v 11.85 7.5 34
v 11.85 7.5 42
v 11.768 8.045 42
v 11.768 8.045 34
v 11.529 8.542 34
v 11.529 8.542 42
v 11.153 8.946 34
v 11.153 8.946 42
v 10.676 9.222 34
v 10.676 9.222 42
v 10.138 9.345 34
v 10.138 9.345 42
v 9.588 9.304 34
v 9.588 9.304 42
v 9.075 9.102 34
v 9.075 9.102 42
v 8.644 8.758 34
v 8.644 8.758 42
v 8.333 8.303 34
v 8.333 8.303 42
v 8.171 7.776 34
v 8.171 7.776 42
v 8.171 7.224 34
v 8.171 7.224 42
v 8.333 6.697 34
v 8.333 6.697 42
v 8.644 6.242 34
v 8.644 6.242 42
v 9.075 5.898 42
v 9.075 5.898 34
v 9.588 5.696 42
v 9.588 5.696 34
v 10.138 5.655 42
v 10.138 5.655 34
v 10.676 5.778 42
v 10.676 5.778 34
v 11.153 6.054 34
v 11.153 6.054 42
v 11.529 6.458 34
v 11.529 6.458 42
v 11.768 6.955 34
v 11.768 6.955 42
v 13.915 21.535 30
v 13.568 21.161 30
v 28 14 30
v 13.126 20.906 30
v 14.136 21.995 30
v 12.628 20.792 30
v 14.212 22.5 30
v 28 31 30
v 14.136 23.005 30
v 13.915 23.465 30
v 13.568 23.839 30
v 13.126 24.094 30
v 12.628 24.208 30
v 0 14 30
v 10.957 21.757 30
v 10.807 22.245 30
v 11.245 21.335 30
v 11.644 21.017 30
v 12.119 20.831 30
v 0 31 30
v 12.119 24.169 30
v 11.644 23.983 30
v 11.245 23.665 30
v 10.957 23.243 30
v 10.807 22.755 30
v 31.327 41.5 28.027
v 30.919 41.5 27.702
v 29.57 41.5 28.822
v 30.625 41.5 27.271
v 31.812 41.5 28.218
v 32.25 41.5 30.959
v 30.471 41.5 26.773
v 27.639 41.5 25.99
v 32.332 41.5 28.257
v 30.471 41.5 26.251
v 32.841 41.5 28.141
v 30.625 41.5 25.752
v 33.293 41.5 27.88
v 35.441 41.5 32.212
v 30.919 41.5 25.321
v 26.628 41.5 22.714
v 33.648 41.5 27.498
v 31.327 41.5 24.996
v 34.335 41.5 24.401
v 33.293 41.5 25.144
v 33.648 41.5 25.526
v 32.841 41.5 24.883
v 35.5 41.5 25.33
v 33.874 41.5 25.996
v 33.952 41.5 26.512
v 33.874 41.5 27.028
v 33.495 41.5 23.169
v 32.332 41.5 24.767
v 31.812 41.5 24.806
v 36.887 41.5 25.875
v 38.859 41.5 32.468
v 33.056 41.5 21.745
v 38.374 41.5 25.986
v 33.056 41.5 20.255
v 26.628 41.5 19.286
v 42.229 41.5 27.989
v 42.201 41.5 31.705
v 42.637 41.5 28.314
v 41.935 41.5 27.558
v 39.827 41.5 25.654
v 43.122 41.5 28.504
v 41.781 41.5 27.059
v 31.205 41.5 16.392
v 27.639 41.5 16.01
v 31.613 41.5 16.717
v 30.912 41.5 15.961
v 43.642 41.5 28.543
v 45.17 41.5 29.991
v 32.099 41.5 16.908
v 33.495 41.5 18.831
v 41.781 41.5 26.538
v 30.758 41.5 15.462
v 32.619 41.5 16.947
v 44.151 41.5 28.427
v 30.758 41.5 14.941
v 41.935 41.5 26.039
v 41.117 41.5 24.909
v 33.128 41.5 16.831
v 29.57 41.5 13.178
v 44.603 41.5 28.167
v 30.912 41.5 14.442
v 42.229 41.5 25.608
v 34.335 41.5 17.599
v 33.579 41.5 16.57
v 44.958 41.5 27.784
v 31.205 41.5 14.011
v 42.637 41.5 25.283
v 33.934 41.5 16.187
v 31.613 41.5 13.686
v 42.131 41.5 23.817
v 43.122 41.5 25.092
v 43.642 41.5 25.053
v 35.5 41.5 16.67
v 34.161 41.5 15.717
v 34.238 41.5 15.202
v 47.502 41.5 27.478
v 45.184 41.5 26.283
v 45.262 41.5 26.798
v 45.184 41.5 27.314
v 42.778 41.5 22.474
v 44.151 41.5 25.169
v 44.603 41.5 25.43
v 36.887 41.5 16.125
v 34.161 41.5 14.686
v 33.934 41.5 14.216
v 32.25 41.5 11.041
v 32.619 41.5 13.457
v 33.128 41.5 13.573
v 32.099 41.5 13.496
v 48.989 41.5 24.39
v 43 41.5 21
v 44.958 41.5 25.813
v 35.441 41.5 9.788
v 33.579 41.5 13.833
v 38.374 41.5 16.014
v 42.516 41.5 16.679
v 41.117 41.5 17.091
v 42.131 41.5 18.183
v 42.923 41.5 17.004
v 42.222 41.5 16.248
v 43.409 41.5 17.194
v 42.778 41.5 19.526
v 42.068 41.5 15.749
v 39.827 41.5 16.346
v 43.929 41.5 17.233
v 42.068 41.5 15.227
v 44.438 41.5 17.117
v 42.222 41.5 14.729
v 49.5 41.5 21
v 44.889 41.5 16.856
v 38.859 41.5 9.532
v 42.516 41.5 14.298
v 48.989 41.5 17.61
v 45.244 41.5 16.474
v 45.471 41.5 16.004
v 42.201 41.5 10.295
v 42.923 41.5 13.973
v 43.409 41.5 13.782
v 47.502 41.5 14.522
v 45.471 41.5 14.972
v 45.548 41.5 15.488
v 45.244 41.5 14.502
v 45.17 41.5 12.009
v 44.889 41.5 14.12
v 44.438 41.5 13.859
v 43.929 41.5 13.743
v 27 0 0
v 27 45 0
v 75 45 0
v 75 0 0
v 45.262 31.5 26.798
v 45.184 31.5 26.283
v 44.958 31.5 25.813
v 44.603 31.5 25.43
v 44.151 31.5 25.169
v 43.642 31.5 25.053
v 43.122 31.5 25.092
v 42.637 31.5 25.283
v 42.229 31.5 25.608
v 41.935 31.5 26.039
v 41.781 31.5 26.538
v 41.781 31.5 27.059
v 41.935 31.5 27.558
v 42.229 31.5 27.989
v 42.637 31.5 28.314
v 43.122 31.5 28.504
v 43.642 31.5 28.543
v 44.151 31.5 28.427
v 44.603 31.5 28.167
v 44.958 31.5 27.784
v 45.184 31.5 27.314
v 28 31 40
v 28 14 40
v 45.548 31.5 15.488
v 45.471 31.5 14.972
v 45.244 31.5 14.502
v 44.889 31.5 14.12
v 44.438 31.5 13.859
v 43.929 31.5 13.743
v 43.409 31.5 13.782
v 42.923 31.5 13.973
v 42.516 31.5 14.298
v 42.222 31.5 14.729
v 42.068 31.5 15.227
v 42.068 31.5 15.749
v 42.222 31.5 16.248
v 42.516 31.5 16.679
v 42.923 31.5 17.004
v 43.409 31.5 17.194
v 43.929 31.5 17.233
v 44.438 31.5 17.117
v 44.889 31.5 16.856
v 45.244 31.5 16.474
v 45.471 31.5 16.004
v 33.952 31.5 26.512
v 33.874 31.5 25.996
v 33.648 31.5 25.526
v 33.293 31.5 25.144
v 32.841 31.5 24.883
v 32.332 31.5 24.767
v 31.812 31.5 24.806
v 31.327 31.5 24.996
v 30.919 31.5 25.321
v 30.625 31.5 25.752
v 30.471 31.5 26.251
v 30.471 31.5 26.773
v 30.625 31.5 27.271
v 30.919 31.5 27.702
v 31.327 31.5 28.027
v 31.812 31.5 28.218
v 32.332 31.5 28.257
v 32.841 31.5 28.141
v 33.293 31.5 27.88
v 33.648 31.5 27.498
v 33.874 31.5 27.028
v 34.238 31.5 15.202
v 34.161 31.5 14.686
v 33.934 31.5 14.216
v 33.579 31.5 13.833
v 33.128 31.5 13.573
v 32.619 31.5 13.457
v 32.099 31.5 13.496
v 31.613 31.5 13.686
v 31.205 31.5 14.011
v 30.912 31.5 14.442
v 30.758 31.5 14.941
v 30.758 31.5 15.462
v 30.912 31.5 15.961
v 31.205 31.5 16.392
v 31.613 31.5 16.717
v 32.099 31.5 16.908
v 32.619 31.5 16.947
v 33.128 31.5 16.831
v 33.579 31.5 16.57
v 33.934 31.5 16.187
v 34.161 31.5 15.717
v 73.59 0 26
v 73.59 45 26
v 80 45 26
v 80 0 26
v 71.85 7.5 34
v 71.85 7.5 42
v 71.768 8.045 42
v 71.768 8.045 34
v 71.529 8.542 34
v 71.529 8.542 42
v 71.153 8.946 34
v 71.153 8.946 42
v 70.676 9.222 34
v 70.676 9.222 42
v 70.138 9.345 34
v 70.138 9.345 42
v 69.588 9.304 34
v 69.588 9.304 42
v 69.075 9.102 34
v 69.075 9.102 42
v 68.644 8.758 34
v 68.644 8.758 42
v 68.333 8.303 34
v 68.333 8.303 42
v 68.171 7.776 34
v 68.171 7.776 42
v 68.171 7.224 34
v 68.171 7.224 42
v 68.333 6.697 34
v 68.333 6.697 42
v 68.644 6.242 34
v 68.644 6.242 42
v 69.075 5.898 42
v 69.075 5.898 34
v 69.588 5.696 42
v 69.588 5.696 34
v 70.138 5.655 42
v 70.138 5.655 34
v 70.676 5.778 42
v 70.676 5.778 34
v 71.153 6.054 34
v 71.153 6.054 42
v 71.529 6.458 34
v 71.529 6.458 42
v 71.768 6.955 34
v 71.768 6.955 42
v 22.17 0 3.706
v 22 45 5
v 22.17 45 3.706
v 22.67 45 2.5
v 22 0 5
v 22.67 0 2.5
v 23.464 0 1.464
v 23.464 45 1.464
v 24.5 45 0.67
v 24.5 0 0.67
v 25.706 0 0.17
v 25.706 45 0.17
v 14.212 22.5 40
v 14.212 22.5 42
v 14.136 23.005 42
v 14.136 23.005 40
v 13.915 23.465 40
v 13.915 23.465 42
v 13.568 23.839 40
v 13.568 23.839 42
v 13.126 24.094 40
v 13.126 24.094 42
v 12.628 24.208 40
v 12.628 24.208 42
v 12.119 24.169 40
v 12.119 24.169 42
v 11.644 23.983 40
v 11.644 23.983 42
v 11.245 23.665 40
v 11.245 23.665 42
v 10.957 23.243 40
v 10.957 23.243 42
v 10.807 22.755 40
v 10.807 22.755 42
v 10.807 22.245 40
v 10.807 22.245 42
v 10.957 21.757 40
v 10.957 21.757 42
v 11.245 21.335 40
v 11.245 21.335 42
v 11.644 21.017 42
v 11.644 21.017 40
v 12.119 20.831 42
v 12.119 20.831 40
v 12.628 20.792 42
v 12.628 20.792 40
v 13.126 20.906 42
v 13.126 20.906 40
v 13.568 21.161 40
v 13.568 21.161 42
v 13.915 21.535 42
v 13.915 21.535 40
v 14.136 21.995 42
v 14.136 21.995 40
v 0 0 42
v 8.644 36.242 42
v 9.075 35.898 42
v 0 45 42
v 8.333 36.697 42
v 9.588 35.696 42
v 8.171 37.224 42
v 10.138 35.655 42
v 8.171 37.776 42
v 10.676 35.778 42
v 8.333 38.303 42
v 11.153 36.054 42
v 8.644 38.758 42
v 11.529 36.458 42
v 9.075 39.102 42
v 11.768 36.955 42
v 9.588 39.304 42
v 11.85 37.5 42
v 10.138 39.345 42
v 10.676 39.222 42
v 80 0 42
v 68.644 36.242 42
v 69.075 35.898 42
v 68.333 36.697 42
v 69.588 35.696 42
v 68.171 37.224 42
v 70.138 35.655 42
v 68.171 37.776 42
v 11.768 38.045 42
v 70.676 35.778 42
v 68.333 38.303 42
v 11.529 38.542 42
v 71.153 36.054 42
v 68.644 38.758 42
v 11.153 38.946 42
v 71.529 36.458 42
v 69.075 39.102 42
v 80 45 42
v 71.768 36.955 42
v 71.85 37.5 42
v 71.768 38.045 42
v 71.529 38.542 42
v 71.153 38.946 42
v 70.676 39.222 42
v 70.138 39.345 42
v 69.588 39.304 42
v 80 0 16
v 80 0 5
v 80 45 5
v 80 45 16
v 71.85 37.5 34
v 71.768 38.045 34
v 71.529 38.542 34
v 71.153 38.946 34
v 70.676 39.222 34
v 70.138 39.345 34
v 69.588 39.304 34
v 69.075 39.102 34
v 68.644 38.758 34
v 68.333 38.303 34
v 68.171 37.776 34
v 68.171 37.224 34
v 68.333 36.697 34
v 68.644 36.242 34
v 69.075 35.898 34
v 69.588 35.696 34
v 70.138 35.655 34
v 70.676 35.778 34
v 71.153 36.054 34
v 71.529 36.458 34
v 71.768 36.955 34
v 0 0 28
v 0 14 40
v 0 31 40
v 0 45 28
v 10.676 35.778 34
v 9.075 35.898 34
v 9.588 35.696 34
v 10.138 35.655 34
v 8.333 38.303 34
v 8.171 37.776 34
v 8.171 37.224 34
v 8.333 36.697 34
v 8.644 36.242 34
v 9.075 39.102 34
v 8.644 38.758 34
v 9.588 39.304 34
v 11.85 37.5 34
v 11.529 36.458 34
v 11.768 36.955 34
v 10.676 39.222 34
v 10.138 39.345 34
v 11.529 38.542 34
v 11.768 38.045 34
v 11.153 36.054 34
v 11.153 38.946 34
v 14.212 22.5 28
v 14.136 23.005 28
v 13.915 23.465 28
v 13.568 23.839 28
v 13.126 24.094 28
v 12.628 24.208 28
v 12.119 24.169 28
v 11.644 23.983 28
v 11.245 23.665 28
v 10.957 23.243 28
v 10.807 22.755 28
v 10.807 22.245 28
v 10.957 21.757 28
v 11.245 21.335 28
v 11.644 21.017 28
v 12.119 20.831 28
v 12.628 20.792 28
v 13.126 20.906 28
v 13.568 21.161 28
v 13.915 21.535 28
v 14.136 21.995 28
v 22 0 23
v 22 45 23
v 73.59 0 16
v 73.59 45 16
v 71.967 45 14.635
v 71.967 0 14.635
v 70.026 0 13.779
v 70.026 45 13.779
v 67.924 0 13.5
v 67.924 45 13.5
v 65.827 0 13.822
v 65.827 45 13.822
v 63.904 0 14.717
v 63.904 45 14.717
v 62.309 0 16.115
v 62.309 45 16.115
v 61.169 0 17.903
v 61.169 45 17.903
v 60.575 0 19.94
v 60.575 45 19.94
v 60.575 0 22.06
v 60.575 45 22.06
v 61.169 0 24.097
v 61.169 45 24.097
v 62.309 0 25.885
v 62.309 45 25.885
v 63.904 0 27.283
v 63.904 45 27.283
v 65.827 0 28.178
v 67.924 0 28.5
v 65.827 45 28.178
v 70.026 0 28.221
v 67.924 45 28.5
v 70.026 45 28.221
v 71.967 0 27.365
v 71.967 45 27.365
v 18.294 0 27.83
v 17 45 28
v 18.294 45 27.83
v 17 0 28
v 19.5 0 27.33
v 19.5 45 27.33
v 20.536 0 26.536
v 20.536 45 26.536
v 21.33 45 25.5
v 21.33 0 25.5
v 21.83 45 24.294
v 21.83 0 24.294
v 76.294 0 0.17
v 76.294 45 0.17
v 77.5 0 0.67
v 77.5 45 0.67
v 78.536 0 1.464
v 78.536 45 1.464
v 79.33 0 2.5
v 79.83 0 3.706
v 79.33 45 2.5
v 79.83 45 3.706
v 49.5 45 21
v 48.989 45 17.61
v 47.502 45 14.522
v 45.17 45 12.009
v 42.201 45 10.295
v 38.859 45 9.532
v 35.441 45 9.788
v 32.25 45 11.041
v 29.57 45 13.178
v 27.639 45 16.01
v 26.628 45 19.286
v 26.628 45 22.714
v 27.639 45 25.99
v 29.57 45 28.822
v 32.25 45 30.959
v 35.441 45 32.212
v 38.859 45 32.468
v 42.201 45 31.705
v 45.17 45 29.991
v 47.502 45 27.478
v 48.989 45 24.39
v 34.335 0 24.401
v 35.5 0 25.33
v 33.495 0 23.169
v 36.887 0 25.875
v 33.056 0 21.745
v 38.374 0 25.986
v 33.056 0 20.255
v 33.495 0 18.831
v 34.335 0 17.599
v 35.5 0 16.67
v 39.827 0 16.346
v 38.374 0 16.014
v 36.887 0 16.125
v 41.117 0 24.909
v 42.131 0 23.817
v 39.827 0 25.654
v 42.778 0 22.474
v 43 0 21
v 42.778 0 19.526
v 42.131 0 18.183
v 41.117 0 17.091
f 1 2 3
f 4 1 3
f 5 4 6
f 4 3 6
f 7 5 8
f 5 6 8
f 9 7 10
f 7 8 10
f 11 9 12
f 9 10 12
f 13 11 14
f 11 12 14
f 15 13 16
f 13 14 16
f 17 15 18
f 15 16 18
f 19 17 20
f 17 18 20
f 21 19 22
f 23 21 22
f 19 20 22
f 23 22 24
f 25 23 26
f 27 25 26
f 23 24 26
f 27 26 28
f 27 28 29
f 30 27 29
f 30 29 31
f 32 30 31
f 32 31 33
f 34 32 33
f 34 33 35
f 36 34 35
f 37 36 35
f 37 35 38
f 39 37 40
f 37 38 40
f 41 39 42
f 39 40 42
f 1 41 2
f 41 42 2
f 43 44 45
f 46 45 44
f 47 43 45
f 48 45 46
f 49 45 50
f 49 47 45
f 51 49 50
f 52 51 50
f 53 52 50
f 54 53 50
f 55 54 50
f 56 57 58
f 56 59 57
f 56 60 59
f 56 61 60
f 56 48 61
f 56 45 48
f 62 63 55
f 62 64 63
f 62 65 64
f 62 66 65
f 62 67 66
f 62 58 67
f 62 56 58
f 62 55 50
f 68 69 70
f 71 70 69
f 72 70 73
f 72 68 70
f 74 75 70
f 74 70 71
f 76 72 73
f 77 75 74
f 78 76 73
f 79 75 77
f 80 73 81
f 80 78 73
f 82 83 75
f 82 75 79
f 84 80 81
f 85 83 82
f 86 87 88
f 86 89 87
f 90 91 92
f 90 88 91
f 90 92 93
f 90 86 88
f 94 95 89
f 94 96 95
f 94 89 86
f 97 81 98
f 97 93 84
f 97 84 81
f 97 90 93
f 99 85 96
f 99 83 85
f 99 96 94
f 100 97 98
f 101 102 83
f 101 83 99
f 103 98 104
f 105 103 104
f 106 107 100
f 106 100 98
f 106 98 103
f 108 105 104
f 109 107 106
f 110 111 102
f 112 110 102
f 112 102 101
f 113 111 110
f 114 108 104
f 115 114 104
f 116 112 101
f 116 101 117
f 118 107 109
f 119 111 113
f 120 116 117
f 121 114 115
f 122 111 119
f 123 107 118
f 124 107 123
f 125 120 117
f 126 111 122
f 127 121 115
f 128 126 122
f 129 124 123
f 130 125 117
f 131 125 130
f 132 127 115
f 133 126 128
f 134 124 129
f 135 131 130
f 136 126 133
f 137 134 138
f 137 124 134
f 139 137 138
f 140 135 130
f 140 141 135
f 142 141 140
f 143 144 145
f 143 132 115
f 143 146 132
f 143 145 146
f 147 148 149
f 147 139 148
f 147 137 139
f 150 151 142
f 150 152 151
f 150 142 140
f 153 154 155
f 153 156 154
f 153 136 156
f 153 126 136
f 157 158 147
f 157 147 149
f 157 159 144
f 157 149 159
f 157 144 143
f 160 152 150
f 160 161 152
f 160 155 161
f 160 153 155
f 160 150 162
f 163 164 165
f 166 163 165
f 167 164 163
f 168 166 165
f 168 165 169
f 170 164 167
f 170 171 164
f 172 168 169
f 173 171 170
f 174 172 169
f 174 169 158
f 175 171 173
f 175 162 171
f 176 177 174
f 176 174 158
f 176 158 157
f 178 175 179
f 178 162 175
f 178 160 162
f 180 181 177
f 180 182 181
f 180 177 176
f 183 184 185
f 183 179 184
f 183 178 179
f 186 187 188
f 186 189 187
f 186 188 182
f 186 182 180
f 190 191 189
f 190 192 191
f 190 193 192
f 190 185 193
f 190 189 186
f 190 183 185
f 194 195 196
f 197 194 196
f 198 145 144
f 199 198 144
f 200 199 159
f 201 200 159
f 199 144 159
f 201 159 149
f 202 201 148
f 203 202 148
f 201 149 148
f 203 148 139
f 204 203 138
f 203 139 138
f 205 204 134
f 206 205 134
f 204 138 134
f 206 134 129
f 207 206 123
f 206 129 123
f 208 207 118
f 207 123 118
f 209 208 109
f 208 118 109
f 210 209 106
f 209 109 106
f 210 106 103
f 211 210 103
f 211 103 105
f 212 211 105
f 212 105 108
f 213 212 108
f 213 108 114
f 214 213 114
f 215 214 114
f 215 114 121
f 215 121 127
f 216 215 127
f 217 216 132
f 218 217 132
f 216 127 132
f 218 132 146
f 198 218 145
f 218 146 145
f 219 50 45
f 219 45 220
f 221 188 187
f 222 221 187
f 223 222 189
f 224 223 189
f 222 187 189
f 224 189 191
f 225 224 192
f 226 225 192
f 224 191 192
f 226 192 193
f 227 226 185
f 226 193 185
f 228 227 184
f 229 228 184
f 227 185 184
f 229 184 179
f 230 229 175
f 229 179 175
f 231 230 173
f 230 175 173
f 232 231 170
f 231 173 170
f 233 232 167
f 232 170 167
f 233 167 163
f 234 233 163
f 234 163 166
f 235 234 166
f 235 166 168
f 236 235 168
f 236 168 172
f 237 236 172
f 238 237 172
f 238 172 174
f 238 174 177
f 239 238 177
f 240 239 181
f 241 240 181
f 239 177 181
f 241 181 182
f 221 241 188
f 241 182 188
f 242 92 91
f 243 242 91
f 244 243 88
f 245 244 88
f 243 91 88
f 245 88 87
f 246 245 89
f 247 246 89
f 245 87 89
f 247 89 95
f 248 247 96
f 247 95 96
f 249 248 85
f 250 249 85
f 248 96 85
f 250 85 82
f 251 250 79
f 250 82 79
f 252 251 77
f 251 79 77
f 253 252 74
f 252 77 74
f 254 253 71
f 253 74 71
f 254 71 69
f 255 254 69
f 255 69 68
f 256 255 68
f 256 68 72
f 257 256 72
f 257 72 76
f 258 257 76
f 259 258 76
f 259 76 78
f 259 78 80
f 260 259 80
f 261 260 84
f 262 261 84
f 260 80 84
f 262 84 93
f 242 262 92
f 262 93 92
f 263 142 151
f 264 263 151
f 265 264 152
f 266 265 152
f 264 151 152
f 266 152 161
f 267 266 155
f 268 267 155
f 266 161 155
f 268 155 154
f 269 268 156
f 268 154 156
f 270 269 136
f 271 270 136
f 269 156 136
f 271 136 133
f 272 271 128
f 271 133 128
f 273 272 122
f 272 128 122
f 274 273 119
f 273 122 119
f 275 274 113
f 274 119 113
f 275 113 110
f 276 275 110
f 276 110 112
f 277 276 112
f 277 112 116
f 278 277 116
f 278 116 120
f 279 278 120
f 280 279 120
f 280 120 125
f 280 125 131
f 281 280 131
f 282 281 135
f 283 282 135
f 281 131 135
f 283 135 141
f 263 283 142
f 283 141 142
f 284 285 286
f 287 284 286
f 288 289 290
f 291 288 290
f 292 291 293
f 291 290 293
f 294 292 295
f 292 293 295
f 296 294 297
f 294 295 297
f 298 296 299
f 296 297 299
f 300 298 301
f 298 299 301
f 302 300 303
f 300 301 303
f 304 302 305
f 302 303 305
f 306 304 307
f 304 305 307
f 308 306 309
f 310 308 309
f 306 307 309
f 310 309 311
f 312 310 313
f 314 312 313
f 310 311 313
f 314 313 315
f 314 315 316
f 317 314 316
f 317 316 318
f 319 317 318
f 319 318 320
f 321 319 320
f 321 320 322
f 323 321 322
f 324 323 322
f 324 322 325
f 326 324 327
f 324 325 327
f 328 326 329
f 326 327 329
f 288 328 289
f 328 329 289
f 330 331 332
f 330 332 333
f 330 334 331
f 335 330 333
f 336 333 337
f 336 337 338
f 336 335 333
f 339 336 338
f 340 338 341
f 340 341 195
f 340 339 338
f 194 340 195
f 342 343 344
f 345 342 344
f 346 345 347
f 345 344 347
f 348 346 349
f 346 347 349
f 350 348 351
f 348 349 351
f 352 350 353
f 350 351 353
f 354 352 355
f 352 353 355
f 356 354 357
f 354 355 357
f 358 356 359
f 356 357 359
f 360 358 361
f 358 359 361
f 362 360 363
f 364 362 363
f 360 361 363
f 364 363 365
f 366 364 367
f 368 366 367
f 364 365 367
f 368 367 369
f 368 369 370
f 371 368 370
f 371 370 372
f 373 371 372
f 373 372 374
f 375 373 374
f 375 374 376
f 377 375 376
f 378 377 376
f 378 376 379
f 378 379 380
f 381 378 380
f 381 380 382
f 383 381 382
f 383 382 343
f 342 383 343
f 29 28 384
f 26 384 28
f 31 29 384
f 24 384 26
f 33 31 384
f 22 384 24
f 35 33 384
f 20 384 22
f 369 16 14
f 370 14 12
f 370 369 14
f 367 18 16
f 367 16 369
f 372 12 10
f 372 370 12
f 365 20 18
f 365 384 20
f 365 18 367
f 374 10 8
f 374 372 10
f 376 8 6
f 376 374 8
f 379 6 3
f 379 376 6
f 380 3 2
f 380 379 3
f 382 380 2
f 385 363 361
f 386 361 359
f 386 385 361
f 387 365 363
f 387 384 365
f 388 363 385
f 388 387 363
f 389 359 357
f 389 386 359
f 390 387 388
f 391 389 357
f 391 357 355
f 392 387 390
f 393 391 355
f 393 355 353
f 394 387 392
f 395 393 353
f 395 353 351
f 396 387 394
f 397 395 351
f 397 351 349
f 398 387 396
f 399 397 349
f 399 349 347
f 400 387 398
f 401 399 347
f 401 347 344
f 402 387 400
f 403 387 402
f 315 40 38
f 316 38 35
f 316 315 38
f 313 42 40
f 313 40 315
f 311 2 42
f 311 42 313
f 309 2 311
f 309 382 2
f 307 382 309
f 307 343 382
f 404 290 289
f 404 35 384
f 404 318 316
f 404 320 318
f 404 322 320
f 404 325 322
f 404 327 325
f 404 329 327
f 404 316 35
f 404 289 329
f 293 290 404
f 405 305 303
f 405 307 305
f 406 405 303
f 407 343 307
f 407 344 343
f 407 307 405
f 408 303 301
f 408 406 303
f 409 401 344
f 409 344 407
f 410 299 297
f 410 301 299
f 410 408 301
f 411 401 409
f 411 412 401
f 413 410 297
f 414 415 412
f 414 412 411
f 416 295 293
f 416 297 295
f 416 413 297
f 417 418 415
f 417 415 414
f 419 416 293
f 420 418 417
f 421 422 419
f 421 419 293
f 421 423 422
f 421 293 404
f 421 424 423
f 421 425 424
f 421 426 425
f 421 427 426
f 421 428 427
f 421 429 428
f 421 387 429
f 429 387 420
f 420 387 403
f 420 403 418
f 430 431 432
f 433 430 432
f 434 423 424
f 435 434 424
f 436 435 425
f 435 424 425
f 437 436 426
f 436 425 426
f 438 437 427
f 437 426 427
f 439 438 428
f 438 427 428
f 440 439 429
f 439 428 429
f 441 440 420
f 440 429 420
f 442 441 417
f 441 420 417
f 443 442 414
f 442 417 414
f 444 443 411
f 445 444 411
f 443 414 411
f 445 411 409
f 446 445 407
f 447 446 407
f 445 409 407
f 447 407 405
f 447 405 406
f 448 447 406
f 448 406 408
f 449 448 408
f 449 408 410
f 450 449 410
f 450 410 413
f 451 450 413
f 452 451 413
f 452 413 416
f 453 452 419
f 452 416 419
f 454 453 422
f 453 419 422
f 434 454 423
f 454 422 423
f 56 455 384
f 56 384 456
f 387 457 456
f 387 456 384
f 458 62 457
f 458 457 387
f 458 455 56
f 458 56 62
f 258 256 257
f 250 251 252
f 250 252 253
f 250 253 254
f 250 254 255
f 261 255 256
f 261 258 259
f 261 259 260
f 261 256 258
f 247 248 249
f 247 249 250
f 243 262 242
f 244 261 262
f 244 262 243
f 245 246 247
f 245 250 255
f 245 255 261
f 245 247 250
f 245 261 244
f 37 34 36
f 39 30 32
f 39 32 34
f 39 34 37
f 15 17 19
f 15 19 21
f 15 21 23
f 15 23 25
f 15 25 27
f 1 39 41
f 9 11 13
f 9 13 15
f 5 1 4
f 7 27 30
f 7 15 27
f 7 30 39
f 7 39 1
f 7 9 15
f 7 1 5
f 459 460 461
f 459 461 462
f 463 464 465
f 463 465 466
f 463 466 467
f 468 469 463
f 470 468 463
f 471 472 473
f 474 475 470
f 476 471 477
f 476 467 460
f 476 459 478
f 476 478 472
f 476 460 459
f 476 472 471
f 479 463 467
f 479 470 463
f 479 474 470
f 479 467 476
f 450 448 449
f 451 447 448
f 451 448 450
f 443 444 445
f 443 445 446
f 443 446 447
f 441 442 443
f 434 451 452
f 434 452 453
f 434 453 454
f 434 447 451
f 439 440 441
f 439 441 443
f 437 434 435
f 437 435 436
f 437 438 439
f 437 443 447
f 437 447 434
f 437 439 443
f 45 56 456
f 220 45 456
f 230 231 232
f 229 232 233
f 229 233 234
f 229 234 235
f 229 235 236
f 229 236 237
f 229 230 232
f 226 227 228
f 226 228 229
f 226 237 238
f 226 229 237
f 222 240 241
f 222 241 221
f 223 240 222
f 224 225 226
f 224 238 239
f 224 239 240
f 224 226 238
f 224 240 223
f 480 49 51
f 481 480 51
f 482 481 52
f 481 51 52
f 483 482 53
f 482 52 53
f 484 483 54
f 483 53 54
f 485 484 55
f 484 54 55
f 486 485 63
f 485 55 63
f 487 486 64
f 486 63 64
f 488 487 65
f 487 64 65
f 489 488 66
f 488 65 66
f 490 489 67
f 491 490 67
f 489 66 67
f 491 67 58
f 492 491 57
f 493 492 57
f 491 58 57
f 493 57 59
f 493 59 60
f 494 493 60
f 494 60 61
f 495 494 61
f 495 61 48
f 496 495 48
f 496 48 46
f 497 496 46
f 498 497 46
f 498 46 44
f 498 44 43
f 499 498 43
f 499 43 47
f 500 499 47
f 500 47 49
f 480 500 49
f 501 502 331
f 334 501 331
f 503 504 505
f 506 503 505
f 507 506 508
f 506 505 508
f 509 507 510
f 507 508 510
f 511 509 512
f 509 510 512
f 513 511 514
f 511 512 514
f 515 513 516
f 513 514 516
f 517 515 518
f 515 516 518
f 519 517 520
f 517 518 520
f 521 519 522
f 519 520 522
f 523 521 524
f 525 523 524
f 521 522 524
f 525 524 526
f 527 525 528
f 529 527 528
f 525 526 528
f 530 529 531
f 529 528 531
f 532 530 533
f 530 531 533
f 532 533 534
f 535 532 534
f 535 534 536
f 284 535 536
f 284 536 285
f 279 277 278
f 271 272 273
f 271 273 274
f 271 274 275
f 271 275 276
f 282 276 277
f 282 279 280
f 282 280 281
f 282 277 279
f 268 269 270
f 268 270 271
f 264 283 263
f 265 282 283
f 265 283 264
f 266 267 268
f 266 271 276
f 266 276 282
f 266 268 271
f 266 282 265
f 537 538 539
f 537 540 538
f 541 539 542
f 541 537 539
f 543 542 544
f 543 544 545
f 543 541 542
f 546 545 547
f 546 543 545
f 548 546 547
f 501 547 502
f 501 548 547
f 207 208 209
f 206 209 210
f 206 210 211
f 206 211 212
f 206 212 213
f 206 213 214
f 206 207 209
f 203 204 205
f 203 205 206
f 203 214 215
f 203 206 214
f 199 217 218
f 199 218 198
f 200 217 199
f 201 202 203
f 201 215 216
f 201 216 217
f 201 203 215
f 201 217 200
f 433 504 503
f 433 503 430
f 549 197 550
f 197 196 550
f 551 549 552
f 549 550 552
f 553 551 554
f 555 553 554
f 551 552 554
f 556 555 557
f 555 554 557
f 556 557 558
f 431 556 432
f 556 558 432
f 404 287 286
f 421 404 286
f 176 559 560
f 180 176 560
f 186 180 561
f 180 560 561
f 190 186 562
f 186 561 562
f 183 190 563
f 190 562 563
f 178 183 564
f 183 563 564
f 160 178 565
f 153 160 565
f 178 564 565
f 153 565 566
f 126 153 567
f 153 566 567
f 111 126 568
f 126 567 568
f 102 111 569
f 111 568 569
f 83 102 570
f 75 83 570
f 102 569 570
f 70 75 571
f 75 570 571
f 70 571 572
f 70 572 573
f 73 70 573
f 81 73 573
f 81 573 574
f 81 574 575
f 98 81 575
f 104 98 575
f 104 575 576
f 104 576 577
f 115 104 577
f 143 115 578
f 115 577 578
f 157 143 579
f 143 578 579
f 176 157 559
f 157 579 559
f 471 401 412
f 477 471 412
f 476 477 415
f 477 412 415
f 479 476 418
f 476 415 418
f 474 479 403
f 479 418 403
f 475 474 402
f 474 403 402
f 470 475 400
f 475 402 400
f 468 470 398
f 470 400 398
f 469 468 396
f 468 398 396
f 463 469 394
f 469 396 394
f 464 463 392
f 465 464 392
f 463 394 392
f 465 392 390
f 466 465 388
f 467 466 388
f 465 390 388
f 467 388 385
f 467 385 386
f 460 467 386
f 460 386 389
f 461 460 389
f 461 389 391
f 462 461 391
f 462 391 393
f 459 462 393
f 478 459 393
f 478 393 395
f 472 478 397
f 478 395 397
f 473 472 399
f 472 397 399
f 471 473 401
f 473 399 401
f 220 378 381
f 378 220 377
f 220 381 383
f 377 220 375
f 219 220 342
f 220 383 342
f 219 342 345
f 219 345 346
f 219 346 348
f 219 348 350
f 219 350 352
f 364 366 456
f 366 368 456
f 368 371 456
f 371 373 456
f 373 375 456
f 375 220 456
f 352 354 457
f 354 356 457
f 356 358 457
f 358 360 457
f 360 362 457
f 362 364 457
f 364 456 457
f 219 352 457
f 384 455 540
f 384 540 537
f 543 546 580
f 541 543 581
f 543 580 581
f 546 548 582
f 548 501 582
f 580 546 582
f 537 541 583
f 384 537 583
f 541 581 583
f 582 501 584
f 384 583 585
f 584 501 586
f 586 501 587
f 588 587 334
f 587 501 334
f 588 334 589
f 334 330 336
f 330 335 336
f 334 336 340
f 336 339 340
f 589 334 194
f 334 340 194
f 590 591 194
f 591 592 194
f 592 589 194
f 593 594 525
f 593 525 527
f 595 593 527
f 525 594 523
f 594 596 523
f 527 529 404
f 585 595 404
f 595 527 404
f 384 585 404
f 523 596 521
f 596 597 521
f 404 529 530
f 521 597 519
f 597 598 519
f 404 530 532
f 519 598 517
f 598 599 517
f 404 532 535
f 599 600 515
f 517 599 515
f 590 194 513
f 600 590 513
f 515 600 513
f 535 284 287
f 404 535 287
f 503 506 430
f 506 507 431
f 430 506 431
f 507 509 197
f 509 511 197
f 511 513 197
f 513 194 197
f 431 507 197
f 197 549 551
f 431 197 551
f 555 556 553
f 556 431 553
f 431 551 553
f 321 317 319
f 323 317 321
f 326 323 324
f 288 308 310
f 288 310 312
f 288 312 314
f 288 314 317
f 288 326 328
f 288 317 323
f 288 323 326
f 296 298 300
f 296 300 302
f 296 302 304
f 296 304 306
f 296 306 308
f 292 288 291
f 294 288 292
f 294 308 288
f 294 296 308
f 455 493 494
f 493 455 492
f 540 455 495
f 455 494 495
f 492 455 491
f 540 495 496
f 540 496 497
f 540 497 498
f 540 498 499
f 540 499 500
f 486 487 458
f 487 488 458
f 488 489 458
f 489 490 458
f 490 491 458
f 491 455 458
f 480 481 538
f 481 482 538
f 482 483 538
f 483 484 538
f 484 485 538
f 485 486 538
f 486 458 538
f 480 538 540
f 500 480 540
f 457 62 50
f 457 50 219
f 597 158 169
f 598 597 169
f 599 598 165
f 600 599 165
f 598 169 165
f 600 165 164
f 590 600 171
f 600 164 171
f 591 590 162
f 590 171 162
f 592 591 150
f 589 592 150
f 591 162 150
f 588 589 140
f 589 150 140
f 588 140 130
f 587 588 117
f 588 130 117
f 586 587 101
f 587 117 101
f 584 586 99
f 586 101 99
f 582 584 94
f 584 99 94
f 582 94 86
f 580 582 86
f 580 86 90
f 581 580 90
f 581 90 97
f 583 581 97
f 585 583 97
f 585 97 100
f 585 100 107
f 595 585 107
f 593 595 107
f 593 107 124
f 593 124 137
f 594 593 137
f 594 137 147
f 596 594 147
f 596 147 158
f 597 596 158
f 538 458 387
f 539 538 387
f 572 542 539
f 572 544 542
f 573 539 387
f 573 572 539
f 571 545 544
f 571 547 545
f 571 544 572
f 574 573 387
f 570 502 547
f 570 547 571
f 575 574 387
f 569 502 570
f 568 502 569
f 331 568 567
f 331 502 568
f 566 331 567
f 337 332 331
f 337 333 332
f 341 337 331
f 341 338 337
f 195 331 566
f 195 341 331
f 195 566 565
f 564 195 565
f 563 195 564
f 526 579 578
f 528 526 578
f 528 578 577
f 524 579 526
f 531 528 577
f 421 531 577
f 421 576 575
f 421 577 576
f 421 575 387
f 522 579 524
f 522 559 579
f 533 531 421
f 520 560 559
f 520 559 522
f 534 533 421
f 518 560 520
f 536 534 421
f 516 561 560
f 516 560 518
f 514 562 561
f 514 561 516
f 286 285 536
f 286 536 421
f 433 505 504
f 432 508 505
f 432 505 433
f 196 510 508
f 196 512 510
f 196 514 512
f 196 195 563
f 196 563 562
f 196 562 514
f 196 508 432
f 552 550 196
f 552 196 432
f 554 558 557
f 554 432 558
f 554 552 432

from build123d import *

# Parameters (mm, degrees)
SKETCH1_W           = 80
SKETCH1_H           = 45
BOSS_EXTRUDE1_DEPTH = 42
SKETCH3_W           = 22
SKETCH3_H           = 28
CUT_EXTRUDE2_DEPTH  = 46
SKETCH4_W           = 10
SKETCH4_H           = 17
CUT_EXTRUDE3_DEPTH  = 28
SKETCH7_R           = 11.5
CUT_EXTRUDE5_DEPTH  = 3.5
SKETCH11_R          = 1.75
CUT_EXTRUDE6_DEPTH  = 10
SKETCH12_R          = 5
CUT_EXTRUDE7_DEPTH  = 42.5
SKETCH13_R          = 7.5
CUT_EXTRUDE8_DEPTH  = 46
SKETCH14_W          = 12.099538741
SKETCH14_H          = 10
CUT_EXTRUDE9_DEPTH  = 46
SKETCH15_R          = 1.712332533
CUT_EXTRUDE10_DEPTH = 43
SKETCH16_R          = 1.85
CUT_EXTRUDE11_DEPTH = 8
FILLET2_R           = 5


with BuildPart() as part:
    # Sketch1 → Boss-Extrude1 (new body)
    with BuildSketch(Plane.XY):
        with Locations((40, 22.5)):
            Rectangle(SKETCH1_W, SKETCH1_H)
    extrude(amount=BOSS_EXTRUDE1_DEPTH)

    # Sketch3 → Cut-Extrude2 (cut, through all)
    with BuildSketch(Plane(origin=(0, 45, 0), x_dir=(1, 0, 0), z_dir=(0, 1, 0))):
        with Locations((11, -14)):
            Rectangle(SKETCH3_W, SKETCH3_H)
    extrude(amount=-CUT_EXTRUDE2_DEPTH, mode=Mode.SUBTRACT)

    # Sketch4 → Cut-Extrude3 (cut)
    with BuildSketch(Plane.ZY):
        with Locations((35, 22.5)):
            Rectangle(SKETCH4_W, SKETCH4_H)
    extrude(amount=-CUT_EXTRUDE3_DEPTH, mode=Mode.SUBTRACT)

    # Sketch7 → Cut-Extrude5 (cut)
    with BuildSketch(Plane(origin=(0, 45, 0), x_dir=(1, 0, 0), z_dir=(0, 1, 0))):
        with Locations((38, -21)):
            Circle(SKETCH7_R)
    extrude(amount=-CUT_EXTRUDE5_DEPTH, mode=Mode.SUBTRACT)

    # Sketch11 → Cut-Extrude6 (cut)
    with BuildSketch(Plane(origin=(0, 41.5, 0), x_dir=(1, 0, 0), z_dir=(0, 1, 0))):
        with Locations((32.201639679, -26.511716392)):
            Circle(SKETCH11_R)
        with Locations((32.488283608, -15.201639679)):
            Circle(SKETCH11_R)
        with Locations((43.798360321, -15.488283608)):
            Circle(SKETCH11_R)
        with Locations((43.511716392, -26.798360321)):
            Circle(SKETCH11_R)
    extrude(amount=-CUT_EXTRUDE6_DEPTH, mode=Mode.SUBTRACT)

    # Sketch12 → Cut-Extrude7 (cut, through all)
    with BuildSketch(Plane(origin=(0, 41.5, 0), x_dir=(1, 0, 0), z_dir=(0, 1, 0))):
        with Locations((38, -21)):
            Circle(SKETCH12_R)
    extrude(amount=-CUT_EXTRUDE7_DEPTH, mode=Mode.SUBTRACT)

    # Sketch13 → Cut-Extrude8 (cut, through all)
    with BuildSketch(Plane(origin=(0, 45, 0), x_dir=(1, 0, 0), z_dir=(0, 1, 0))):
        with Locations((68, -21)):
            Circle(SKETCH13_R)
    extrude(amount=-CUT_EXTRUDE8_DEPTH, mode=Mode.SUBTRACT)

    # Sketch14 → Cut-Extrude9 (cut, through all)
    with BuildSketch(Plane(origin=(0, 45, 0), x_dir=(1, 0, 0), z_dir=(0, 1, 0))):
        with Locations((73.950230629, -21)):
            Rectangle(SKETCH14_W, SKETCH14_H)
    extrude(amount=-CUT_EXTRUDE9_DEPTH, mode=Mode.SUBTRACT)

    # Sketch15 → Cut-Extrude10 (cut, through all)
    with BuildSketch(Plane.XY.offset(42)):
        with Locations((12.5, 22.500000001)):
            Circle(SKETCH15_R)
    extrude(amount=-CUT_EXTRUDE10_DEPTH, mode=Mode.SUBTRACT)

    # Sketch16 → Cut-Extrude11 (cut)
    with BuildSketch(Plane.XY.offset(42)):
        with Locations((10, 37.5)):
            Circle(SKETCH16_R)
        with Locations((70, 37.5)):
            Circle(SKETCH16_R)
        with Locations((70, 7.5)):
            Circle(SKETCH16_R)
        with Locations((10, 7.5)):
            Circle(SKETCH16_R)
    extrude(amount=-CUT_EXTRUDE11_DEPTH, mode=Mode.SUBTRACT)

    # Fillet2
    fillet2_edges = [part.edges().sort_by_distance(p)[0] for p in [
        (22, 22.5, 0),
        (22, 22.5, 28),
        (80, 22.5, 0),
    ]]
    fillet(fillet2_edges, radius=FILLET2_R)


solid = part.part
